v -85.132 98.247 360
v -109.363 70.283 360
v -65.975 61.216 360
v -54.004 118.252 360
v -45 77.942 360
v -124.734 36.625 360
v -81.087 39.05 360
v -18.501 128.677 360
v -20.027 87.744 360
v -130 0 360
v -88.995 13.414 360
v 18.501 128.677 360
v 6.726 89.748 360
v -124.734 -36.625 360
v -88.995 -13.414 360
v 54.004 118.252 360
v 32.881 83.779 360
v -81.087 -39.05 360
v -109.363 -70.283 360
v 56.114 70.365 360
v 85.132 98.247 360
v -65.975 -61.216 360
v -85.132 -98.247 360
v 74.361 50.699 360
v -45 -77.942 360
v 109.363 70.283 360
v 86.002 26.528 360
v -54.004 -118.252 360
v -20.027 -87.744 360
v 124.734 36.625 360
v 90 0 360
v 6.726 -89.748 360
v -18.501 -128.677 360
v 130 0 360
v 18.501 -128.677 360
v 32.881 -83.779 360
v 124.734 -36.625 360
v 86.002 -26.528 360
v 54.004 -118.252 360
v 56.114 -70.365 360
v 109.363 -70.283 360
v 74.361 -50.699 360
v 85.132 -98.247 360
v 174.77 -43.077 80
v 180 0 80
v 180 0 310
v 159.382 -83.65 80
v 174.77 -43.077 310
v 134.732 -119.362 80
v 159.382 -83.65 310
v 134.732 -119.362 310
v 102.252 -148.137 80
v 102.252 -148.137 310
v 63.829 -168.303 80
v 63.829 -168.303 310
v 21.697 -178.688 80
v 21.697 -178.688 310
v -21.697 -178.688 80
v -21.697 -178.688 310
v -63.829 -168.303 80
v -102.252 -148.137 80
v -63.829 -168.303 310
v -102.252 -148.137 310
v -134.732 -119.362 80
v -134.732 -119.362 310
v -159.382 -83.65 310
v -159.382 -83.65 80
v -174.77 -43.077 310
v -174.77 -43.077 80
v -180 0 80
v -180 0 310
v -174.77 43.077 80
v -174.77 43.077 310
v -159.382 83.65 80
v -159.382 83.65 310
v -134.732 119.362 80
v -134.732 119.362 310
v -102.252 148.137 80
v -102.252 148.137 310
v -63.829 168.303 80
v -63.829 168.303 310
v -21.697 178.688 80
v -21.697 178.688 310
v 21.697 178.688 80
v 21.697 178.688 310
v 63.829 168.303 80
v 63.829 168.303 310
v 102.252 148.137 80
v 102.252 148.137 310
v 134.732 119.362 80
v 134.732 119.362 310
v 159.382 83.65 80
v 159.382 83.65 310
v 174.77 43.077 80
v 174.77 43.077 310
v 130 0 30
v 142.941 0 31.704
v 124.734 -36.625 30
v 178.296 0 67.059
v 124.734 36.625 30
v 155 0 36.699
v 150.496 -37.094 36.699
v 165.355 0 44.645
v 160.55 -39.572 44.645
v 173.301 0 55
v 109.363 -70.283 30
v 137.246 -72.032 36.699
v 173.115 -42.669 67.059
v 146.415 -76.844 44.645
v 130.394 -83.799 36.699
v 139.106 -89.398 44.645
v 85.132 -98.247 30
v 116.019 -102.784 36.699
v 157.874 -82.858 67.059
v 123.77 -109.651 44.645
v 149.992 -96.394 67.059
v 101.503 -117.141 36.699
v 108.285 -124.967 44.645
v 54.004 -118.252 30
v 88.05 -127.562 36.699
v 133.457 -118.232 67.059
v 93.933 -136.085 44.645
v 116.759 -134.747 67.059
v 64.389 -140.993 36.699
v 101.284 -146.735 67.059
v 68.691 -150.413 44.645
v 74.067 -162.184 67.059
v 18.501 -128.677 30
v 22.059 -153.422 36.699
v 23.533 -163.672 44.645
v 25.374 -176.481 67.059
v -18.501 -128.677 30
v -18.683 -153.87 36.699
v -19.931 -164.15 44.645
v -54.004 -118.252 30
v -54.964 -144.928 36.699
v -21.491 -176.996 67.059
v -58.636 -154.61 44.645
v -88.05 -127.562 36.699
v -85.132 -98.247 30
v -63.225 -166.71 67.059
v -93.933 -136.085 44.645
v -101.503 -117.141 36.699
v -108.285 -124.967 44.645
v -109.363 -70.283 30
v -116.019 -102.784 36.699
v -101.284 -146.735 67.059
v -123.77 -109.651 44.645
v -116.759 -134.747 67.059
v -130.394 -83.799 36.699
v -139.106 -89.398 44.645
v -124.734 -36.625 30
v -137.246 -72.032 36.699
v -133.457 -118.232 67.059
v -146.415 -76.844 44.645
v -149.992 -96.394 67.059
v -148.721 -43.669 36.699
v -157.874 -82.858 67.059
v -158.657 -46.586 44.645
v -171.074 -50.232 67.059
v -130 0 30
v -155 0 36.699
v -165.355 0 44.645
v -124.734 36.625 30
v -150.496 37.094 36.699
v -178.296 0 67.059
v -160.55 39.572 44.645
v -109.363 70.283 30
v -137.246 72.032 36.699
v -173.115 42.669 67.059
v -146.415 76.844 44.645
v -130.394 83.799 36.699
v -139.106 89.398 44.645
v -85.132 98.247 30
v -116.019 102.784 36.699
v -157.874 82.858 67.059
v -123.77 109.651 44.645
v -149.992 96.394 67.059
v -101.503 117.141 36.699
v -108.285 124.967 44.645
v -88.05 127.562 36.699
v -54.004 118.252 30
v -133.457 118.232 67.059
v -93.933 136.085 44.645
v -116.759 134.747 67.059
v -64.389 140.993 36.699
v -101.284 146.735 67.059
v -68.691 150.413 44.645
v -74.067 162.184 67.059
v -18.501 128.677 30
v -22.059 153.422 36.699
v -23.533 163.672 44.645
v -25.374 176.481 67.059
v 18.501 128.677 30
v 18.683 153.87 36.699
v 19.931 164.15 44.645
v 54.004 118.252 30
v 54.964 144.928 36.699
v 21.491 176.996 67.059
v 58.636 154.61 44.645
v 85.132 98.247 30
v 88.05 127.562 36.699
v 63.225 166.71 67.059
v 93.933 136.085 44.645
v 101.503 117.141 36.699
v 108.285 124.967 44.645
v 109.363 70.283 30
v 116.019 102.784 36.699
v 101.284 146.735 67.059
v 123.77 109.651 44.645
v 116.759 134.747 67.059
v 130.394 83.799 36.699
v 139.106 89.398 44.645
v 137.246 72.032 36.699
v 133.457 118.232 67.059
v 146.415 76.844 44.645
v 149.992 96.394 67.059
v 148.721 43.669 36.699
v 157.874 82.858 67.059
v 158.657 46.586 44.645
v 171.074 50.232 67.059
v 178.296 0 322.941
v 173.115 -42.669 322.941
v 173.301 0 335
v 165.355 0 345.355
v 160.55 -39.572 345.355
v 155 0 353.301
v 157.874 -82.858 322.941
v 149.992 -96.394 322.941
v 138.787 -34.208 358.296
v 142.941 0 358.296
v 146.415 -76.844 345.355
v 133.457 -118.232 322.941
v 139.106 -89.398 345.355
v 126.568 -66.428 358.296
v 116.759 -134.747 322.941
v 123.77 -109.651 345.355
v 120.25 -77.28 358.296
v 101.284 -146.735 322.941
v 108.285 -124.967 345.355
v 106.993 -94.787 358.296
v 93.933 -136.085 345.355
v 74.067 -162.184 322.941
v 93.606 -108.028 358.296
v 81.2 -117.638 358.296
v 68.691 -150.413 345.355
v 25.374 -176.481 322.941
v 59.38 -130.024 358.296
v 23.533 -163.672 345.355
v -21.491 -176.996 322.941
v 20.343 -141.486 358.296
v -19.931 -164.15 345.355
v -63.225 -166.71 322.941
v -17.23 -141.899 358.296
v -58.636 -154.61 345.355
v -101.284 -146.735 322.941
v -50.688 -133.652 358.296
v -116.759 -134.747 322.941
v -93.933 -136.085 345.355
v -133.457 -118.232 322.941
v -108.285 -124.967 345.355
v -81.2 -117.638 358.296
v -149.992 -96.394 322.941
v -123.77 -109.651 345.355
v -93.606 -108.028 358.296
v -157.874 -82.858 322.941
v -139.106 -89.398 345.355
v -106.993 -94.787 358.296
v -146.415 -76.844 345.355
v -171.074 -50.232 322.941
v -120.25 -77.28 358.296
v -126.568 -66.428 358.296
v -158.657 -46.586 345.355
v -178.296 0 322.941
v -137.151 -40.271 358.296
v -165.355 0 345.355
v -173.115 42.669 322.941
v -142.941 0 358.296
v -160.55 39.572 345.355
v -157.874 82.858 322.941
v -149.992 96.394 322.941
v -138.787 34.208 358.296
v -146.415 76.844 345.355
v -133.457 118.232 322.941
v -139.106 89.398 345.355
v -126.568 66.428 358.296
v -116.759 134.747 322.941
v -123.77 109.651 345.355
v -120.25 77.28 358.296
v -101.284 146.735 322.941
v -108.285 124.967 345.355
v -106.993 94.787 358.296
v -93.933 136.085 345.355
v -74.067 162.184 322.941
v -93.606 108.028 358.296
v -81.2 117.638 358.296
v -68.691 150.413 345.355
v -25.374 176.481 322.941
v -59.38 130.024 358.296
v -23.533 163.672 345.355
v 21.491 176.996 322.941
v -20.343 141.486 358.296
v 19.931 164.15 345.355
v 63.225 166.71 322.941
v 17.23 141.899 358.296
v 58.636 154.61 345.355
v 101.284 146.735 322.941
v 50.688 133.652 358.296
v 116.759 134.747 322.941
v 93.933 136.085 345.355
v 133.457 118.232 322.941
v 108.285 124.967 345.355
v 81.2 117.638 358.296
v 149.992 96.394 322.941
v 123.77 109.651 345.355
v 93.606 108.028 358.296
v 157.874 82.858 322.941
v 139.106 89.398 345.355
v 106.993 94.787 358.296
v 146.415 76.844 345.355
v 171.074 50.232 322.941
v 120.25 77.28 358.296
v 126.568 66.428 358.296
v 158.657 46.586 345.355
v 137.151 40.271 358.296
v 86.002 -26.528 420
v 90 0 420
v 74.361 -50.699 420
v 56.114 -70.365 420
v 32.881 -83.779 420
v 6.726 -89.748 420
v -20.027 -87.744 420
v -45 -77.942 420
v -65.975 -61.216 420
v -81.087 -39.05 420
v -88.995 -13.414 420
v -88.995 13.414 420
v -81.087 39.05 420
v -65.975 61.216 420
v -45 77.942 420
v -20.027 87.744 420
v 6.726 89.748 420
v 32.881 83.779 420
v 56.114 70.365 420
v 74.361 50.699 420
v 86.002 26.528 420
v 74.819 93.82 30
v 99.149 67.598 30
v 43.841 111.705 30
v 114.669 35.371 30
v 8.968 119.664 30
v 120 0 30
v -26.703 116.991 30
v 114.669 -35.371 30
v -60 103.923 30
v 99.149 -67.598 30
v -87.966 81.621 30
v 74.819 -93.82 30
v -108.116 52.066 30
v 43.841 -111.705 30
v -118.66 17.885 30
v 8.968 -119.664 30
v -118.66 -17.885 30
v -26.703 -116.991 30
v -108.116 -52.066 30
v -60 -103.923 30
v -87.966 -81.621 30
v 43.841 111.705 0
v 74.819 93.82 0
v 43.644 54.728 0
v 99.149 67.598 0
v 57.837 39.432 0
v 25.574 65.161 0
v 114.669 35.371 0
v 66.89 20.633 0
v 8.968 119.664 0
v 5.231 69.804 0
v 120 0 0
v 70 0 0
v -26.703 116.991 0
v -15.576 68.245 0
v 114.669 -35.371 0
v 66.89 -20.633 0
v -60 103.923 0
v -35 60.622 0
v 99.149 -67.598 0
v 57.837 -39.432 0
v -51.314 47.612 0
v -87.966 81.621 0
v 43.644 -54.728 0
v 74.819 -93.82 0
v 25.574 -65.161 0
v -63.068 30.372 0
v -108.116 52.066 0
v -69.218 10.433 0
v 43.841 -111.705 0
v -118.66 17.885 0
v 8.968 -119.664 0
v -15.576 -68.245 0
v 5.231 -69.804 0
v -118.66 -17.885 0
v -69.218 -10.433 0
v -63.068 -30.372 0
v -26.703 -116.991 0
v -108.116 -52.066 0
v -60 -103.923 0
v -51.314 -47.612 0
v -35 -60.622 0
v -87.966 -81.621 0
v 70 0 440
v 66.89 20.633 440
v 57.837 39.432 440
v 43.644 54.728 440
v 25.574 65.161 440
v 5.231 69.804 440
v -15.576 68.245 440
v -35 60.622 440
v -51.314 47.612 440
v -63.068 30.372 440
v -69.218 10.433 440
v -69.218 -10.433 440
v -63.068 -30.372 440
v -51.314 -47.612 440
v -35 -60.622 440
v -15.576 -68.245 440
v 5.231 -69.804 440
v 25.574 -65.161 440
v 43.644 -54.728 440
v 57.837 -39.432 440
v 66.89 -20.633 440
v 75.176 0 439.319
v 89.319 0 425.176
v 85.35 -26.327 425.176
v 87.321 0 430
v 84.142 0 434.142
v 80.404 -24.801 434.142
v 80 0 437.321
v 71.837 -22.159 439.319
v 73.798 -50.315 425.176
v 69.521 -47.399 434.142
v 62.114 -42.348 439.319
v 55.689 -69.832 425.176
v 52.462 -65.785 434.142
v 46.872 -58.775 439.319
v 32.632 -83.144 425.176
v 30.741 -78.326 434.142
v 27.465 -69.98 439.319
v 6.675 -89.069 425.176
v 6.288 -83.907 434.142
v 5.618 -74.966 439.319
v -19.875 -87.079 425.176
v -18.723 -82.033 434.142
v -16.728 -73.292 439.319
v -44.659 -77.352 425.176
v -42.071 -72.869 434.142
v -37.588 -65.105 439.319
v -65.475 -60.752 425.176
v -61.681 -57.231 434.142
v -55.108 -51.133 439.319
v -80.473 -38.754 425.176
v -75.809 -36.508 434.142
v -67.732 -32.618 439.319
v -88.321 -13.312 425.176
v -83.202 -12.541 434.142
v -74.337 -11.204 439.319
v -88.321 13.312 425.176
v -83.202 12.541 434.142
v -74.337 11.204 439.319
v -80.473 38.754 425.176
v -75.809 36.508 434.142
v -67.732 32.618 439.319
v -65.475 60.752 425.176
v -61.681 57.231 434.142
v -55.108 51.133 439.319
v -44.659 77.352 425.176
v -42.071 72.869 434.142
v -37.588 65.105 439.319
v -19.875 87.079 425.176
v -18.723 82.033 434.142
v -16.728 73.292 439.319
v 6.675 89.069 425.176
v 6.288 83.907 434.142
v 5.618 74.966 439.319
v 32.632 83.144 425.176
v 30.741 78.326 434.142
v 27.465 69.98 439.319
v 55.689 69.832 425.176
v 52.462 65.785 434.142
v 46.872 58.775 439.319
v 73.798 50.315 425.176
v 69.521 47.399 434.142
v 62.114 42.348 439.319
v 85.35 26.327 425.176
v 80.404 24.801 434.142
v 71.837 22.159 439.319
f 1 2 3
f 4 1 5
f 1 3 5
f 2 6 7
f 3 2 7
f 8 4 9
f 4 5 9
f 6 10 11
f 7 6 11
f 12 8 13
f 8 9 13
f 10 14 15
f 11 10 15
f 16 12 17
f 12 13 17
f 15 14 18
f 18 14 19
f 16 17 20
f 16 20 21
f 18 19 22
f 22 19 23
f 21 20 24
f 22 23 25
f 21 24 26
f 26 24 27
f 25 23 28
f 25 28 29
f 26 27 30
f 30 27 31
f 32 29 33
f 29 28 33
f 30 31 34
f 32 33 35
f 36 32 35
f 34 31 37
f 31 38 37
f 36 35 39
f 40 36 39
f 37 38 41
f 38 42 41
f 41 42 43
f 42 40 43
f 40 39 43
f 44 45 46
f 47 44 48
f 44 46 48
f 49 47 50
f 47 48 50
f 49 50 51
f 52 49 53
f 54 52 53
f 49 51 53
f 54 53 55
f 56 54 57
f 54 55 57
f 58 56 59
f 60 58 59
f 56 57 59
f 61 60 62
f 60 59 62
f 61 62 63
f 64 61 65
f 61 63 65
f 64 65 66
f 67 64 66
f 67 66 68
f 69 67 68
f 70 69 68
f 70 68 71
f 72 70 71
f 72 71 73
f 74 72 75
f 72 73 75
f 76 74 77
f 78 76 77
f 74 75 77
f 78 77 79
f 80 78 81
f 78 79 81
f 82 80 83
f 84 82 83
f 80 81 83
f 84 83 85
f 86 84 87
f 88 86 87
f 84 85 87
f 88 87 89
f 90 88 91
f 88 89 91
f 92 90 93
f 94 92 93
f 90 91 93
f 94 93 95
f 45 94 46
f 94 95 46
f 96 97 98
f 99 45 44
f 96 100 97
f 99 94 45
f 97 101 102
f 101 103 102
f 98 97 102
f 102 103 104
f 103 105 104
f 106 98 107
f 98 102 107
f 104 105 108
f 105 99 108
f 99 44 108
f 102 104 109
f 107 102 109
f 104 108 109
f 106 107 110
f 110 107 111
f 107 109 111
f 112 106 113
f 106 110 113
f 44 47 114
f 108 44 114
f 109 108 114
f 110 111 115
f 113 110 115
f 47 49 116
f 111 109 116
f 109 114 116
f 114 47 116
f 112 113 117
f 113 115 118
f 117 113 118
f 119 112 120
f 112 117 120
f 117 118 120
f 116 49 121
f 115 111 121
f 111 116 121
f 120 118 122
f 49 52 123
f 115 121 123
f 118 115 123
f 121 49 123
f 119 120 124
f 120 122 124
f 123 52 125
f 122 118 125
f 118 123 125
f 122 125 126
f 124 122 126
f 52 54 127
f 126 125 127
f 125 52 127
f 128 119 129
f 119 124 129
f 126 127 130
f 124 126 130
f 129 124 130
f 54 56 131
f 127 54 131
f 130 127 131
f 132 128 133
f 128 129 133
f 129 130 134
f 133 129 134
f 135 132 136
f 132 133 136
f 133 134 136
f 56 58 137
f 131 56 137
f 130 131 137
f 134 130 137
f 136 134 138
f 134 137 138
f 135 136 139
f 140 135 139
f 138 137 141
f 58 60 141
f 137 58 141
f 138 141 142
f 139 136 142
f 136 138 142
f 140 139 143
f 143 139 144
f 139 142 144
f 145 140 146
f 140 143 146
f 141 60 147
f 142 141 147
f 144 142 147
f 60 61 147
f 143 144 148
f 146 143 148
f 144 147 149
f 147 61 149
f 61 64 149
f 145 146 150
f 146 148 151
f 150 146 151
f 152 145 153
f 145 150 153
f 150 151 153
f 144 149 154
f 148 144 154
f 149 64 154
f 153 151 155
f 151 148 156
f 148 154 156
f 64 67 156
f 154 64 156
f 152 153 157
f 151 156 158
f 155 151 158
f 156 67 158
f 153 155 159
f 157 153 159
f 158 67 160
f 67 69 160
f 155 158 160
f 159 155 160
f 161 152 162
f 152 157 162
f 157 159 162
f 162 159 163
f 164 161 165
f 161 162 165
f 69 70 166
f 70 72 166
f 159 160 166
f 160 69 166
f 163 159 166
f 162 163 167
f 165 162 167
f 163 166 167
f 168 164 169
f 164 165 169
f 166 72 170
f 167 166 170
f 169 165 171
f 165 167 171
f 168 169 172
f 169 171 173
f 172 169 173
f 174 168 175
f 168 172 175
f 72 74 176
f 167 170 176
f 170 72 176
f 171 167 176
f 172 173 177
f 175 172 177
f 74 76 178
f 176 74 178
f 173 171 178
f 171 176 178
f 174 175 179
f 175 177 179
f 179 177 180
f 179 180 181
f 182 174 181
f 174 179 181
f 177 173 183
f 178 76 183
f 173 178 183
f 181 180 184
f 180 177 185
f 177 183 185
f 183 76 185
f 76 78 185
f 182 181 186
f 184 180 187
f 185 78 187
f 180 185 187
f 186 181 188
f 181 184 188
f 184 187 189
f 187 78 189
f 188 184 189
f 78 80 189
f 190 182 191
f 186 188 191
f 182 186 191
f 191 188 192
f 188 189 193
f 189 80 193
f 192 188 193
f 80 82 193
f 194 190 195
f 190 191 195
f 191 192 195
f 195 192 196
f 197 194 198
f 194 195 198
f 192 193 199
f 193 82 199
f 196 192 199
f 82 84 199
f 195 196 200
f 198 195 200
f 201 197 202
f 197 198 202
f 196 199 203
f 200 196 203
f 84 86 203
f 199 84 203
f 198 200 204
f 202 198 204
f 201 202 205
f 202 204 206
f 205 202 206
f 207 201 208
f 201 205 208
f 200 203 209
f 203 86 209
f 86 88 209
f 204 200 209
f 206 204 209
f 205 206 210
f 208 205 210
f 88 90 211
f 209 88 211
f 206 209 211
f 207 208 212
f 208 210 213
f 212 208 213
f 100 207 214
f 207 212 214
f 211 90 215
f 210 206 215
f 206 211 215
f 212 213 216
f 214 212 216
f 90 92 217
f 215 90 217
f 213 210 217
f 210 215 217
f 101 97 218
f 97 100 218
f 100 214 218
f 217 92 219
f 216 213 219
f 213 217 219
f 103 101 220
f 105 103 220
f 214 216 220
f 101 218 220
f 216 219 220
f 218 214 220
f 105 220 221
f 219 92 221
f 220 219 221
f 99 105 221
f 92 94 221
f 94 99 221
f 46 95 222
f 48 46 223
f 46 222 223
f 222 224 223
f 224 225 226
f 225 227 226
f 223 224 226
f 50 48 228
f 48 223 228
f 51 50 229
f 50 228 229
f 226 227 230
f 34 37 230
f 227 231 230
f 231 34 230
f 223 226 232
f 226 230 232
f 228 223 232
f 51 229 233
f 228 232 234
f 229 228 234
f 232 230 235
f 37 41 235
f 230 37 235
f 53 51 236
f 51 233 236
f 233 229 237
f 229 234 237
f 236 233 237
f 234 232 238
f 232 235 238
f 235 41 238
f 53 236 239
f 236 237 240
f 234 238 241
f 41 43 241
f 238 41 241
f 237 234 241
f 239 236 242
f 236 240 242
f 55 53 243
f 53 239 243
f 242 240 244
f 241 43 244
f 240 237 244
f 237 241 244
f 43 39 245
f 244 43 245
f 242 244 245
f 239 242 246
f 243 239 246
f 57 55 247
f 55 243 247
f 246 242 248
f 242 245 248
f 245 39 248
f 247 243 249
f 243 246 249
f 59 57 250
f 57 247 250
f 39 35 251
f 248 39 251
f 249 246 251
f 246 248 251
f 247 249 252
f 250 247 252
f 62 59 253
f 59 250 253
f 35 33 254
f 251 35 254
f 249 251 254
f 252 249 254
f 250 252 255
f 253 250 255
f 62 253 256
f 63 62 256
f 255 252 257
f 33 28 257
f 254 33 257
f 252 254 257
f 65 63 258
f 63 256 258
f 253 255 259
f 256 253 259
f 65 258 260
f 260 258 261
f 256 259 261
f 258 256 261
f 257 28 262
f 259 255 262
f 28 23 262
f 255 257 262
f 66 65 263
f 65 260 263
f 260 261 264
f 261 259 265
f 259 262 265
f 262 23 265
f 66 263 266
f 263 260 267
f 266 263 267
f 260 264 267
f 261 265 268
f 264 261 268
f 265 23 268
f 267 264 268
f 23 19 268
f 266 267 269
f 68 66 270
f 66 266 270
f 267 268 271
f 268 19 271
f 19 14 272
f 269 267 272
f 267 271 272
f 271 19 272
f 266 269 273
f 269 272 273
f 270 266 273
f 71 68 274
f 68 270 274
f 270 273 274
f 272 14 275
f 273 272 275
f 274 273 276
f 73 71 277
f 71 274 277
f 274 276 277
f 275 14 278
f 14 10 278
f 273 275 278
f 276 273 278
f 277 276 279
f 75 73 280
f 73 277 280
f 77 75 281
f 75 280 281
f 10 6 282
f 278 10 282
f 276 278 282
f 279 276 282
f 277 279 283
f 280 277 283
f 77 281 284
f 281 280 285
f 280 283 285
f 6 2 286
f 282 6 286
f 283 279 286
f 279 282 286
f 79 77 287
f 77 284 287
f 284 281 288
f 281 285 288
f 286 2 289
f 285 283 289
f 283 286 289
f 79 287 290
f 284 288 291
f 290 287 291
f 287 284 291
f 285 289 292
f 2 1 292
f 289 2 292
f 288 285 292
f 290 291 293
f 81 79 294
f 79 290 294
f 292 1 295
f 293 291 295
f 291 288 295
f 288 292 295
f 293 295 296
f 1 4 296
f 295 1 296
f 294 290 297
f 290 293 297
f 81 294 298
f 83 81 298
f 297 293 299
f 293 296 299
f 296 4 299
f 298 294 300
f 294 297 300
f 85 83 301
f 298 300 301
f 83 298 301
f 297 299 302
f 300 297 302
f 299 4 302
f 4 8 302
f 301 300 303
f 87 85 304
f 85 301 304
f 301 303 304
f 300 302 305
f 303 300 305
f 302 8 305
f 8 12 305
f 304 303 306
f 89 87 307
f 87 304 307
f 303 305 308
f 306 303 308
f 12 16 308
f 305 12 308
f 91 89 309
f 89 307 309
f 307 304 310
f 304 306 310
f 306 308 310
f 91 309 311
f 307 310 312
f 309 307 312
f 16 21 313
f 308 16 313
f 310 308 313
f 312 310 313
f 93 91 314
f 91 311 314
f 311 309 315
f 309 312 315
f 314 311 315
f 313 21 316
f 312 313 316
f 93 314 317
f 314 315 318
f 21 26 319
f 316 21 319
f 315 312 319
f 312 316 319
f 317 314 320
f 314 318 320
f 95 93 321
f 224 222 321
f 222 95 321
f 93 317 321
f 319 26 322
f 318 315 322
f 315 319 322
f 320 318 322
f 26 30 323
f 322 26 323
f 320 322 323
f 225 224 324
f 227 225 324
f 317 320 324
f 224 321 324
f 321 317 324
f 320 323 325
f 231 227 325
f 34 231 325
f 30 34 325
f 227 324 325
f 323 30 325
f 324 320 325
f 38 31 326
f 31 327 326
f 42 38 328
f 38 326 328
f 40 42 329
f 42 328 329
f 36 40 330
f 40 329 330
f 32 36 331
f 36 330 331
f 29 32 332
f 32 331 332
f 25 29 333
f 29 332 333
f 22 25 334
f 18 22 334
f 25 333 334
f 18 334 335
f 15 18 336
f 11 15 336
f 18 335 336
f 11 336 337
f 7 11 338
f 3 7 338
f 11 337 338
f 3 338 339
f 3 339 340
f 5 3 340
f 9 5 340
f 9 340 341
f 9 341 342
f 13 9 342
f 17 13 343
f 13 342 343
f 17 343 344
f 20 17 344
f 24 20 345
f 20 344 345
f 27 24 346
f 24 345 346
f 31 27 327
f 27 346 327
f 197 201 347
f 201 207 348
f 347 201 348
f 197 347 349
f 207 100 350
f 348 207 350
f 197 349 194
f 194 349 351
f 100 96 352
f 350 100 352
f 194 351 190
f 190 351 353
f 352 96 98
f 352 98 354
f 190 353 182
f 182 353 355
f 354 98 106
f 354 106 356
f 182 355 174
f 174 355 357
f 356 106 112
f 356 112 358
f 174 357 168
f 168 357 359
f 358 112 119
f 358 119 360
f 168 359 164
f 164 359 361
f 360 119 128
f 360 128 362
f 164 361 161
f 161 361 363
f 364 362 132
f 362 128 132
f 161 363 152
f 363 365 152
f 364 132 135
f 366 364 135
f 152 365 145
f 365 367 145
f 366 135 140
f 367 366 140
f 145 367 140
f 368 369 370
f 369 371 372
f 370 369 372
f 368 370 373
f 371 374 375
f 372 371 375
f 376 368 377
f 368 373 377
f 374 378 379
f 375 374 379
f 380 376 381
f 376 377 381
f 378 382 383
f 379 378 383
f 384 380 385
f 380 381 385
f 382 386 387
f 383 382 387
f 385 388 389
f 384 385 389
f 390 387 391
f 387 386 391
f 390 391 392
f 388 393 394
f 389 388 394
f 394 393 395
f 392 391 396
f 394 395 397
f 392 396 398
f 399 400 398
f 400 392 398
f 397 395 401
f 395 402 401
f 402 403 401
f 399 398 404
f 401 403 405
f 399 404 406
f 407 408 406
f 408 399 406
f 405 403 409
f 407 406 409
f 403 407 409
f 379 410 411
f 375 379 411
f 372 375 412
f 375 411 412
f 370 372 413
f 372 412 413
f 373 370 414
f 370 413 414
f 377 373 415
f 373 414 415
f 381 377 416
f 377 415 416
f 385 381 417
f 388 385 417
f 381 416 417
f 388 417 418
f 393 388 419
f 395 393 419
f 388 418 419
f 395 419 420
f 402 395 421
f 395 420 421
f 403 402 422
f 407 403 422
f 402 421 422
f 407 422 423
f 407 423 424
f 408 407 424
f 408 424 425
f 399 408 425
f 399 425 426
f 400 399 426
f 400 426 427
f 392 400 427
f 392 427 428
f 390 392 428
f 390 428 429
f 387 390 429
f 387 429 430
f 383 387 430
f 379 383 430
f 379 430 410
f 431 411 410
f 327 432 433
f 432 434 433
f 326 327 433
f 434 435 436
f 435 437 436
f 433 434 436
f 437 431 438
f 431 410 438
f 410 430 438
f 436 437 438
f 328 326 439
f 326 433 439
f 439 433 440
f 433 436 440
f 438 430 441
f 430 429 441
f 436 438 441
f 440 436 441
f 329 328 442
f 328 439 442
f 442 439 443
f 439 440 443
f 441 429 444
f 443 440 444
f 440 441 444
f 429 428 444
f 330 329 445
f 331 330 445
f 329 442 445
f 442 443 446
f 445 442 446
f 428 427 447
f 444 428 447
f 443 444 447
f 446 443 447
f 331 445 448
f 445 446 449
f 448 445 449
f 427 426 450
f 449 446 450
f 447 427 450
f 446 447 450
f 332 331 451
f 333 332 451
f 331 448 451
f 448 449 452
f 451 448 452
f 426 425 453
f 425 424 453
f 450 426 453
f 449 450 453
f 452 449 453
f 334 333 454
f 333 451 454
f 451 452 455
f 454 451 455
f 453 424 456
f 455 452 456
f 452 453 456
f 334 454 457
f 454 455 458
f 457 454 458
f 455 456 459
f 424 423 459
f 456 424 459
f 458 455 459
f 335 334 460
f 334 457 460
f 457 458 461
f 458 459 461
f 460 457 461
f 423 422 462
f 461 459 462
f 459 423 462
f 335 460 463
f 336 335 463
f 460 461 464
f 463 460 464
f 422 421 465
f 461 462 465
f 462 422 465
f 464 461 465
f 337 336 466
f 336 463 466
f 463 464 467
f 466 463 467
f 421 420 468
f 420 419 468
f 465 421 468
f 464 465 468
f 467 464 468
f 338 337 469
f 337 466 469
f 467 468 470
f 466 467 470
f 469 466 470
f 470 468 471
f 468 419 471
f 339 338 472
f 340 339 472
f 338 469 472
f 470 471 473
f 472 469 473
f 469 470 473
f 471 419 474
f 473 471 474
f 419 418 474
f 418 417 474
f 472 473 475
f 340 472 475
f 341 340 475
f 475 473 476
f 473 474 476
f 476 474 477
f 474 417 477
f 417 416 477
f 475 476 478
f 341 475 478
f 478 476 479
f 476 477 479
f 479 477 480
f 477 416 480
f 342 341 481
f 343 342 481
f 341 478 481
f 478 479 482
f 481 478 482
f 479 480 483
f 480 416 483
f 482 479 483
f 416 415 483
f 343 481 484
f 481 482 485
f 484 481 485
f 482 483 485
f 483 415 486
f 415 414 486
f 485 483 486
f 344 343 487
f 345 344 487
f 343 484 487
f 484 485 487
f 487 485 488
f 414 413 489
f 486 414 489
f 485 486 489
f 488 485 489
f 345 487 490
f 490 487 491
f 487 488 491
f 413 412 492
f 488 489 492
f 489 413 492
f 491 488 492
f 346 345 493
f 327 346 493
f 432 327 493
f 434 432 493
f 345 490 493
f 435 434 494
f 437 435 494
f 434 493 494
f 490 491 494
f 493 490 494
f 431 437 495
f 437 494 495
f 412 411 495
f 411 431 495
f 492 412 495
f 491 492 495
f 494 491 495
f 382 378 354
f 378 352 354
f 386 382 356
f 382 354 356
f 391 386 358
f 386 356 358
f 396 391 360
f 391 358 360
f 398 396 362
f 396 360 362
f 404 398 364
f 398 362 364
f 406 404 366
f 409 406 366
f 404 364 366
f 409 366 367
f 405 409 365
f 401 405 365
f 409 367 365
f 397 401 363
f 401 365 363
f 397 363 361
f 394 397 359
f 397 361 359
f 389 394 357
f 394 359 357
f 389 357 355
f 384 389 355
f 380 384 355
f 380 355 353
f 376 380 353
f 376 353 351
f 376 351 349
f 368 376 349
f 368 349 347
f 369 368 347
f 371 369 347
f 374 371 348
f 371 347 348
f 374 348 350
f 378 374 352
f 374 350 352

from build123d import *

# Parameters (mm, degrees)
F2_R     = 70
F3_DEPTH = 500


with BuildPart() as f1:
    # F0 (on Front) → F1 (revolve)
    with BuildSketch(Plane.XZ):
        with BuildLine():
            Line((70, 440), (0, 440))
            Line((0, 440), (0, 0))
            Line((0, 0), (120, 0))
            Line((120, 0), (120, 30))
            Line((120, 30), (130, 30))
            ThreePointArc((130, 30), (165.355339, 44.644661), (180, 80))
            Line((180, 80), (180, 310))
            ThreePointArc((180, 310), (165.355339, 345.355339), (130, 360))
            Line((130, 360), (90, 360))
            Line((90, 360), (90, 420))
            ThreePointArc((90, 420), (84.142136, 434.142136), (70, 440))
        make_face()
    revolve(axis=Axis((0, 0, 220), (0, 0, -1)))

    # F2 (on face) → F3 (cut)
    with BuildSketch(Plane.XY.offset(440)):
        Circle(F2_R)
    extrude(amount=-F3_DEPTH, mode=Mode.SUBTRACT)


solid = f1.part
